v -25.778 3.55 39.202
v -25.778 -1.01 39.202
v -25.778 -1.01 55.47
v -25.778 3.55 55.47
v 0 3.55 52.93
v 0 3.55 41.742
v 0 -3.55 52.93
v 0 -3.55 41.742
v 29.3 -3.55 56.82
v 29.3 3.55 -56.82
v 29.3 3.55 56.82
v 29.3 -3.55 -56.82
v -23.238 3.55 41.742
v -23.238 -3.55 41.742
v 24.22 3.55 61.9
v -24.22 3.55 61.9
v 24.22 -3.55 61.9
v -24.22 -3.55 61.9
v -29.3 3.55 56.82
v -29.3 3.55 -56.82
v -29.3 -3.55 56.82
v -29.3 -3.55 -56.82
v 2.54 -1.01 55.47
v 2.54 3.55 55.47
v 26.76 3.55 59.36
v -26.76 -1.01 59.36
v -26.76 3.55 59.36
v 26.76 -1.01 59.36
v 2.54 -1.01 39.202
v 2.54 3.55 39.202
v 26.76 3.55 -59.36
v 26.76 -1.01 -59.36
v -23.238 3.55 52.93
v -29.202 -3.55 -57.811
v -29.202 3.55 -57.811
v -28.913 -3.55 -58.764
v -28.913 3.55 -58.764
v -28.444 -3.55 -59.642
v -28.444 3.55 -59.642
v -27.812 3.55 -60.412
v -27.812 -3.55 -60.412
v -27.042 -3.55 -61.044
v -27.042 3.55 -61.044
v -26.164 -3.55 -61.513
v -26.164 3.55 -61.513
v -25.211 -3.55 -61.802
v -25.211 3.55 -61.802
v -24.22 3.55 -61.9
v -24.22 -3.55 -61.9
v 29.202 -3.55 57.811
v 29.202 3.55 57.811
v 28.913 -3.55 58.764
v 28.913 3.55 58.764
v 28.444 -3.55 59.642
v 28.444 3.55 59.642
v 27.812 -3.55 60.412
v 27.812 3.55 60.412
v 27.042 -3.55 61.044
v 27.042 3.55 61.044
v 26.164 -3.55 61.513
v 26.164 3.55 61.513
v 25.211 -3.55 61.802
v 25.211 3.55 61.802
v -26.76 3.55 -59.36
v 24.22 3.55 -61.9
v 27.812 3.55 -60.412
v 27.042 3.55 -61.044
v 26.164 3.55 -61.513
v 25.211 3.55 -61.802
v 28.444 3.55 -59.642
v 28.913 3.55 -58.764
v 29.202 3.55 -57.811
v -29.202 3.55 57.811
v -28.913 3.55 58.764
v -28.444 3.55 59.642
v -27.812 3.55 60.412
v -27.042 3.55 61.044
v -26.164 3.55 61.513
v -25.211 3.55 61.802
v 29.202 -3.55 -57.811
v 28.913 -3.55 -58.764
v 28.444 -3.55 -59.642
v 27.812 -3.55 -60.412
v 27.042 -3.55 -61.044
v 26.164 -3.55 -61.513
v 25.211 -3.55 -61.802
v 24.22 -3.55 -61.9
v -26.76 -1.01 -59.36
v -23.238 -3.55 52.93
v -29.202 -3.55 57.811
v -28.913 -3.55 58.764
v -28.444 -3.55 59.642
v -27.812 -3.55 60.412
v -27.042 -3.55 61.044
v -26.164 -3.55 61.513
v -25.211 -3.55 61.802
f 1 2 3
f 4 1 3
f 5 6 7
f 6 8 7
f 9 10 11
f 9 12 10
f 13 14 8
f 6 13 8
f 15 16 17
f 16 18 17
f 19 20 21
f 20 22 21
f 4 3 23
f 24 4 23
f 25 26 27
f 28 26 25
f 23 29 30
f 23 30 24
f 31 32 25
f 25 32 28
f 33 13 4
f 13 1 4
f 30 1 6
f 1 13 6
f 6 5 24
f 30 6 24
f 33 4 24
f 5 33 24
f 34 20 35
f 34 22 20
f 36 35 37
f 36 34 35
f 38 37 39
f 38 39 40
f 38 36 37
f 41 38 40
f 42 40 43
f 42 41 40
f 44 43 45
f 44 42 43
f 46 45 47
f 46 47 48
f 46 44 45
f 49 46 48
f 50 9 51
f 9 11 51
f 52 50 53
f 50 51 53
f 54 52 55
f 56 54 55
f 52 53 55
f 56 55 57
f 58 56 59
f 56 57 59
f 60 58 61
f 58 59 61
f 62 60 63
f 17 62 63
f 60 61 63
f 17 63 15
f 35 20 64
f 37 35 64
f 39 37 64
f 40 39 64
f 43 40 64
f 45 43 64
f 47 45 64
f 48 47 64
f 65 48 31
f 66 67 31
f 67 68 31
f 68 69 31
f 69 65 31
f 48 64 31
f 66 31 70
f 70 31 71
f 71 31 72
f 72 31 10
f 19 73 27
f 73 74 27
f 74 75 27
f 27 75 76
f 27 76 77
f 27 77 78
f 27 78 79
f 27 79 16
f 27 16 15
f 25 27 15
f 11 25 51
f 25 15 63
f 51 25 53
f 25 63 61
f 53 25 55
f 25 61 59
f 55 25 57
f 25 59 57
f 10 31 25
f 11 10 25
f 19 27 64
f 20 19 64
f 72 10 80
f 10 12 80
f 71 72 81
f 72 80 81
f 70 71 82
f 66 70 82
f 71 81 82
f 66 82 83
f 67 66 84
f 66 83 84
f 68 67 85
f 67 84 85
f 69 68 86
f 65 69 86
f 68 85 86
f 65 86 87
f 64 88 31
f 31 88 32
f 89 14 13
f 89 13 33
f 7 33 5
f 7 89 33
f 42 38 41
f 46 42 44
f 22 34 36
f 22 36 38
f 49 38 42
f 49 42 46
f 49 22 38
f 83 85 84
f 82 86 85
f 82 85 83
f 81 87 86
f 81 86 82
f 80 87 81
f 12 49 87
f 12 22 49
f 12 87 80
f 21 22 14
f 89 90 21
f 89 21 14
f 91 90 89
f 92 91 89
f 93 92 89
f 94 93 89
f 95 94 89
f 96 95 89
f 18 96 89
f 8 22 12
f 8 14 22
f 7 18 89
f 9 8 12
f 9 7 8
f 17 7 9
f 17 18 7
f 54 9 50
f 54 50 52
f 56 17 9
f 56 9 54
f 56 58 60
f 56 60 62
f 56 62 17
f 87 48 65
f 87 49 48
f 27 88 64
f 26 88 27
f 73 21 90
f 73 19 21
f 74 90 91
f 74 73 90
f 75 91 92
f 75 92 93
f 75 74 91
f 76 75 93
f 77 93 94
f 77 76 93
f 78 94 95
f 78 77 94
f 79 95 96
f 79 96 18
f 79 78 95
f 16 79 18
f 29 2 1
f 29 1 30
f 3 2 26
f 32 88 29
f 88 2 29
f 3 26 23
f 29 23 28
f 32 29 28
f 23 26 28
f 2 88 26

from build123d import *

# Parameters (mm, degrees)
F0_W     = 58.6
F0_H     = 123.8
F0_W_2   = 23.2377052307
F0_H_2   = 11.1885257065
F1_DEPTH = 3.55
F2_T     = -2.54
F3_R     = 5.08


with BuildPart() as f1:
    # F0 (on Front) → F1 (new body, symmetric)
    with BuildSketch(Plane.XZ):
        Rectangle(F0_W, F0_H)
        with Locations((-11.6188526154, 47.3360661417)):
            Rectangle(F0_W_2, F0_H_2, mode=Mode.SUBTRACT)
    extrude(amount=F1_DEPTH, both=True)

    # F2
    f2_openings = [f1.faces().sort_by_distance(p)[0] for p in [
        (0.431878, 3.55, -1.759504),
    ]]
    offset(amount=F2_T, openings=f2_openings, kind=Kind.INTERSECTION)

    # F3
    f3_edges = [f1.edges().sort_by_distance(p)[0] for p in [
        (29.3, 0, 61.9),
        (-29.3, 0, 61.9),
        (29.3, 0, -61.9),
        (-29.3, 0, -61.9),
    ]]
    fillet(f3_edges, radius=F3_R)


solid = f1.part
